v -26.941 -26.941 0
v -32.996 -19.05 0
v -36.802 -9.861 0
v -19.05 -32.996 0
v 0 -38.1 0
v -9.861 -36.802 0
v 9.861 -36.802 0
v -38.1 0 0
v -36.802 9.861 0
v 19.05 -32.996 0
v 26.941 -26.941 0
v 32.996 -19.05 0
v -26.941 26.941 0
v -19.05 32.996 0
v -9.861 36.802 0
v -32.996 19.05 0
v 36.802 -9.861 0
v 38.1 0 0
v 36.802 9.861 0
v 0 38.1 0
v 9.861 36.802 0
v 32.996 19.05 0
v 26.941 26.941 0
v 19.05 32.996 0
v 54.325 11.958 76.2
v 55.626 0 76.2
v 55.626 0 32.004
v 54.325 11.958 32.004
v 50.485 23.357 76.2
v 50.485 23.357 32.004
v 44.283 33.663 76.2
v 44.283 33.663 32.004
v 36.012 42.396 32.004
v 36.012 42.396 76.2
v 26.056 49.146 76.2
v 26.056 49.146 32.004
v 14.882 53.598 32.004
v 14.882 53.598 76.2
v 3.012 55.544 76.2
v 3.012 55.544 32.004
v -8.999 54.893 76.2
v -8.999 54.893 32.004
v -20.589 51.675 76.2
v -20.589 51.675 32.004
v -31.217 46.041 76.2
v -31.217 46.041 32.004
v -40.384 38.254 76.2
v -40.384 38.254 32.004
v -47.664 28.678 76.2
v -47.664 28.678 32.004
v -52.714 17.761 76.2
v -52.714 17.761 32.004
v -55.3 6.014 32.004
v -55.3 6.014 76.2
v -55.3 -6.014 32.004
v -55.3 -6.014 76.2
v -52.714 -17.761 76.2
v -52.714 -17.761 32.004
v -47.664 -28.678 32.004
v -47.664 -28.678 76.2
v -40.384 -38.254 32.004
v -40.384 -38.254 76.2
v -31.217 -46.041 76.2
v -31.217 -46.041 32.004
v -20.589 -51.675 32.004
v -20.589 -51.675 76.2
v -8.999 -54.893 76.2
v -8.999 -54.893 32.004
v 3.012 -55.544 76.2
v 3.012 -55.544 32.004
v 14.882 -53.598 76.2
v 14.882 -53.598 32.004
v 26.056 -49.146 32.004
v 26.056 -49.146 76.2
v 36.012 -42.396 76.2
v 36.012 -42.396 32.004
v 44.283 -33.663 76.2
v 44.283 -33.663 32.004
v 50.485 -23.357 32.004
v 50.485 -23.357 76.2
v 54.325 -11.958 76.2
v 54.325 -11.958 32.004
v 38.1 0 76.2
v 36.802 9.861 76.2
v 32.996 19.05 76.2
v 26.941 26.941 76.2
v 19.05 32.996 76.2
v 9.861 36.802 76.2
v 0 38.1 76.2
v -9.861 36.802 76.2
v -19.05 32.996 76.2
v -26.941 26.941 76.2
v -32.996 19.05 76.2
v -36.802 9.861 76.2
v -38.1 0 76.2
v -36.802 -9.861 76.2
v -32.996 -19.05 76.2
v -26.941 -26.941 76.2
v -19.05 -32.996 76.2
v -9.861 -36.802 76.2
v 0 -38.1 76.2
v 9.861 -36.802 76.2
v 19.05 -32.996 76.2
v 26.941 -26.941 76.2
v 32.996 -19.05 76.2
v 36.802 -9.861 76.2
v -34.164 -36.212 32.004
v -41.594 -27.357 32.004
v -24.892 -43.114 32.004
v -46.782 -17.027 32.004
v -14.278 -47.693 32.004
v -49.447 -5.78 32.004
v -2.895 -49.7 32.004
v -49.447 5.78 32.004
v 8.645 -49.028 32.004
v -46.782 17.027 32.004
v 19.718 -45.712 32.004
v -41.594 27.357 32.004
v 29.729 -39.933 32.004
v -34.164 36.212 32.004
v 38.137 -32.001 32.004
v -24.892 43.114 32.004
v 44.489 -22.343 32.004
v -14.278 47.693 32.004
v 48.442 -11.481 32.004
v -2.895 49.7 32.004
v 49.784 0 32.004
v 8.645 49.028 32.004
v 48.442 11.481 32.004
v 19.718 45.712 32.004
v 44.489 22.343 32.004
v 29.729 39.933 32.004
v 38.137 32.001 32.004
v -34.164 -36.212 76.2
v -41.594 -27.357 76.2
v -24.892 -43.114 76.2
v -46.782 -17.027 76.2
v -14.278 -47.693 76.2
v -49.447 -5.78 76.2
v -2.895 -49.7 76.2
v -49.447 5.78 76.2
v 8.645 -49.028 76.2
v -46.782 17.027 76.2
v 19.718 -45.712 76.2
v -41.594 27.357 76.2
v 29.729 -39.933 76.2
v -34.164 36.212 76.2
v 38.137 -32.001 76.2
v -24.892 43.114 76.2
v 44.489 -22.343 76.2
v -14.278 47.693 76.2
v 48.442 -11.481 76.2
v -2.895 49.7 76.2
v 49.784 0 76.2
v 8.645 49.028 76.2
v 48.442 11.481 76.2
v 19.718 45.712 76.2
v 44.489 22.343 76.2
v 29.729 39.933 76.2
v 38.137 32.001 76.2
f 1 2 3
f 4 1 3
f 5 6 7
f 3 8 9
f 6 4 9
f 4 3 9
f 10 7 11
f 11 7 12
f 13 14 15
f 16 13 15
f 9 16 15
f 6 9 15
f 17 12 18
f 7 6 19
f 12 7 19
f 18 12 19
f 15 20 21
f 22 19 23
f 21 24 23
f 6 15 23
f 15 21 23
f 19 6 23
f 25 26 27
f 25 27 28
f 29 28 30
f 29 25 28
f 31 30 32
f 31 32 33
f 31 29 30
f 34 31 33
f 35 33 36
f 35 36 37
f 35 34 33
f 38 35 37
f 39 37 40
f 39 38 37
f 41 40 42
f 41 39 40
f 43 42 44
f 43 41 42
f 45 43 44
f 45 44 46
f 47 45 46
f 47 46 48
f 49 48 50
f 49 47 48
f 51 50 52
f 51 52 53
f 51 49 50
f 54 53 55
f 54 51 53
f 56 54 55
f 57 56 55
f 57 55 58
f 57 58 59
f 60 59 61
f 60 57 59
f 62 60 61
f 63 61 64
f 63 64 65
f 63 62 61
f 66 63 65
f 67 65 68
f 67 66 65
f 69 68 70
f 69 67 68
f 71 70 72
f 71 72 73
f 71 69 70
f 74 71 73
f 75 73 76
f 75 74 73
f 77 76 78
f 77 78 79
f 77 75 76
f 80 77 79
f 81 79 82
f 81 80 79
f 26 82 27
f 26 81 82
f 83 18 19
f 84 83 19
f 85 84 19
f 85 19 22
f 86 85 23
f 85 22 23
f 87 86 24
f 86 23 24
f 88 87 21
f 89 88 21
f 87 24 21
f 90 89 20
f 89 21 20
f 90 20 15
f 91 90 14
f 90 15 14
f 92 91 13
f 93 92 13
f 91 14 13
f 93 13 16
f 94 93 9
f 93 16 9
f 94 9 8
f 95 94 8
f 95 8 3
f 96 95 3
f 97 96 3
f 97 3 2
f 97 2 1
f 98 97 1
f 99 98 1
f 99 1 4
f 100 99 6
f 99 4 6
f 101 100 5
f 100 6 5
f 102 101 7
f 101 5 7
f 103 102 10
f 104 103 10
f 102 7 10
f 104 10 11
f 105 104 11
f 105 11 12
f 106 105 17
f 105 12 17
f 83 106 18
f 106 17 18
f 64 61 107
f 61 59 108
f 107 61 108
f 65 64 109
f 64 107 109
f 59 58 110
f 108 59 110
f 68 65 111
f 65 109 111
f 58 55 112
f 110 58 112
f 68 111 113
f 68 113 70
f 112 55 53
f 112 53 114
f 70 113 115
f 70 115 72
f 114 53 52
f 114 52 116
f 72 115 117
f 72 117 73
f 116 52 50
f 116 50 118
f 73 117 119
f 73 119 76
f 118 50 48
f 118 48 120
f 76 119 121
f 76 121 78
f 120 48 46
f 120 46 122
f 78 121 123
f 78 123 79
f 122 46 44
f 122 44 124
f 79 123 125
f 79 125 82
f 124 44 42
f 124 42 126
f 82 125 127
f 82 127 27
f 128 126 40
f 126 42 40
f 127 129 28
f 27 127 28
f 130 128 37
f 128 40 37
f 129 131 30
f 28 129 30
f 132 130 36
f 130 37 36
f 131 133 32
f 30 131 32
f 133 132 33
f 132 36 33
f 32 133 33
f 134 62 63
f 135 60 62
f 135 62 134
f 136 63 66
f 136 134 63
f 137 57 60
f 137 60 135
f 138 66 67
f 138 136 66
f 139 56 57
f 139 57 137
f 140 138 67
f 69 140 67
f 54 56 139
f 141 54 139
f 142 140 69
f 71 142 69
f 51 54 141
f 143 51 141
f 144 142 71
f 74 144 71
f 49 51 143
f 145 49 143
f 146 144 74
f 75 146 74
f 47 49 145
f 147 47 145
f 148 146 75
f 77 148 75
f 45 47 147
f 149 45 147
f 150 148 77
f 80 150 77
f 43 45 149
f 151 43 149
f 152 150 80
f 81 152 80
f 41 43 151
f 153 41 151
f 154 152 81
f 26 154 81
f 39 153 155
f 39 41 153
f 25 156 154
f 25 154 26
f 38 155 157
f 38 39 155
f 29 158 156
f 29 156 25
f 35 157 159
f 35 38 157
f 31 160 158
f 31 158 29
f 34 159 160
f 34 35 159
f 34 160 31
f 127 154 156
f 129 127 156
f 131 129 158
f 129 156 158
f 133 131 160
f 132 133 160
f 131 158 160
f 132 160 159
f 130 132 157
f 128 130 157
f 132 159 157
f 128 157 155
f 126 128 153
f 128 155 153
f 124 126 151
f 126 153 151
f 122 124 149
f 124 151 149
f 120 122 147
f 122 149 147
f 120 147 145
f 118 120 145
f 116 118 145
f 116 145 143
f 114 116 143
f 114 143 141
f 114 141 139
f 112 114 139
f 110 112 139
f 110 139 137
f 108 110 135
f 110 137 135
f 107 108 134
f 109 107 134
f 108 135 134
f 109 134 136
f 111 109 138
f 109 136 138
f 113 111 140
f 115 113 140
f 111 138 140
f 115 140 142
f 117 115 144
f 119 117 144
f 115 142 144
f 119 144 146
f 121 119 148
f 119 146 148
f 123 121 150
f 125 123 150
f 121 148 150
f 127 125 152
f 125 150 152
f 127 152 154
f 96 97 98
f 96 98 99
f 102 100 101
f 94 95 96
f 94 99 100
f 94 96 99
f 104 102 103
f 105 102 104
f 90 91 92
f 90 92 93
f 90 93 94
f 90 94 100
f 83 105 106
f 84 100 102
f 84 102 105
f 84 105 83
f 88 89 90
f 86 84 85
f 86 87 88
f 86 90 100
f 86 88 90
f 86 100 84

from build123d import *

# Parameters (mm, degrees)
F0_R     = 38.1
F1_DEPTH = 76.2
F2_R     = 55.626001
F2_R_2   = 49.784001
F3_DEPTH = 44.196


with BuildPart() as f1:
    # F0 (on Top) → F1 (new body)
    with BuildSketch(Plane.XY):
        Circle(F0_R)
    extrude(amount=F1_DEPTH)


with BuildPart() as f3:
    # F2 (on face) → F3 (new body)
    with BuildSketch(Plane.XY.offset(76.2)):
        Circle(F2_R)
        Circle(F2_R_2, mode=Mode.SUBTRACT)
    extrude(amount=-F3_DEPTH)


solid = Compound([f1.part, f3.part])
